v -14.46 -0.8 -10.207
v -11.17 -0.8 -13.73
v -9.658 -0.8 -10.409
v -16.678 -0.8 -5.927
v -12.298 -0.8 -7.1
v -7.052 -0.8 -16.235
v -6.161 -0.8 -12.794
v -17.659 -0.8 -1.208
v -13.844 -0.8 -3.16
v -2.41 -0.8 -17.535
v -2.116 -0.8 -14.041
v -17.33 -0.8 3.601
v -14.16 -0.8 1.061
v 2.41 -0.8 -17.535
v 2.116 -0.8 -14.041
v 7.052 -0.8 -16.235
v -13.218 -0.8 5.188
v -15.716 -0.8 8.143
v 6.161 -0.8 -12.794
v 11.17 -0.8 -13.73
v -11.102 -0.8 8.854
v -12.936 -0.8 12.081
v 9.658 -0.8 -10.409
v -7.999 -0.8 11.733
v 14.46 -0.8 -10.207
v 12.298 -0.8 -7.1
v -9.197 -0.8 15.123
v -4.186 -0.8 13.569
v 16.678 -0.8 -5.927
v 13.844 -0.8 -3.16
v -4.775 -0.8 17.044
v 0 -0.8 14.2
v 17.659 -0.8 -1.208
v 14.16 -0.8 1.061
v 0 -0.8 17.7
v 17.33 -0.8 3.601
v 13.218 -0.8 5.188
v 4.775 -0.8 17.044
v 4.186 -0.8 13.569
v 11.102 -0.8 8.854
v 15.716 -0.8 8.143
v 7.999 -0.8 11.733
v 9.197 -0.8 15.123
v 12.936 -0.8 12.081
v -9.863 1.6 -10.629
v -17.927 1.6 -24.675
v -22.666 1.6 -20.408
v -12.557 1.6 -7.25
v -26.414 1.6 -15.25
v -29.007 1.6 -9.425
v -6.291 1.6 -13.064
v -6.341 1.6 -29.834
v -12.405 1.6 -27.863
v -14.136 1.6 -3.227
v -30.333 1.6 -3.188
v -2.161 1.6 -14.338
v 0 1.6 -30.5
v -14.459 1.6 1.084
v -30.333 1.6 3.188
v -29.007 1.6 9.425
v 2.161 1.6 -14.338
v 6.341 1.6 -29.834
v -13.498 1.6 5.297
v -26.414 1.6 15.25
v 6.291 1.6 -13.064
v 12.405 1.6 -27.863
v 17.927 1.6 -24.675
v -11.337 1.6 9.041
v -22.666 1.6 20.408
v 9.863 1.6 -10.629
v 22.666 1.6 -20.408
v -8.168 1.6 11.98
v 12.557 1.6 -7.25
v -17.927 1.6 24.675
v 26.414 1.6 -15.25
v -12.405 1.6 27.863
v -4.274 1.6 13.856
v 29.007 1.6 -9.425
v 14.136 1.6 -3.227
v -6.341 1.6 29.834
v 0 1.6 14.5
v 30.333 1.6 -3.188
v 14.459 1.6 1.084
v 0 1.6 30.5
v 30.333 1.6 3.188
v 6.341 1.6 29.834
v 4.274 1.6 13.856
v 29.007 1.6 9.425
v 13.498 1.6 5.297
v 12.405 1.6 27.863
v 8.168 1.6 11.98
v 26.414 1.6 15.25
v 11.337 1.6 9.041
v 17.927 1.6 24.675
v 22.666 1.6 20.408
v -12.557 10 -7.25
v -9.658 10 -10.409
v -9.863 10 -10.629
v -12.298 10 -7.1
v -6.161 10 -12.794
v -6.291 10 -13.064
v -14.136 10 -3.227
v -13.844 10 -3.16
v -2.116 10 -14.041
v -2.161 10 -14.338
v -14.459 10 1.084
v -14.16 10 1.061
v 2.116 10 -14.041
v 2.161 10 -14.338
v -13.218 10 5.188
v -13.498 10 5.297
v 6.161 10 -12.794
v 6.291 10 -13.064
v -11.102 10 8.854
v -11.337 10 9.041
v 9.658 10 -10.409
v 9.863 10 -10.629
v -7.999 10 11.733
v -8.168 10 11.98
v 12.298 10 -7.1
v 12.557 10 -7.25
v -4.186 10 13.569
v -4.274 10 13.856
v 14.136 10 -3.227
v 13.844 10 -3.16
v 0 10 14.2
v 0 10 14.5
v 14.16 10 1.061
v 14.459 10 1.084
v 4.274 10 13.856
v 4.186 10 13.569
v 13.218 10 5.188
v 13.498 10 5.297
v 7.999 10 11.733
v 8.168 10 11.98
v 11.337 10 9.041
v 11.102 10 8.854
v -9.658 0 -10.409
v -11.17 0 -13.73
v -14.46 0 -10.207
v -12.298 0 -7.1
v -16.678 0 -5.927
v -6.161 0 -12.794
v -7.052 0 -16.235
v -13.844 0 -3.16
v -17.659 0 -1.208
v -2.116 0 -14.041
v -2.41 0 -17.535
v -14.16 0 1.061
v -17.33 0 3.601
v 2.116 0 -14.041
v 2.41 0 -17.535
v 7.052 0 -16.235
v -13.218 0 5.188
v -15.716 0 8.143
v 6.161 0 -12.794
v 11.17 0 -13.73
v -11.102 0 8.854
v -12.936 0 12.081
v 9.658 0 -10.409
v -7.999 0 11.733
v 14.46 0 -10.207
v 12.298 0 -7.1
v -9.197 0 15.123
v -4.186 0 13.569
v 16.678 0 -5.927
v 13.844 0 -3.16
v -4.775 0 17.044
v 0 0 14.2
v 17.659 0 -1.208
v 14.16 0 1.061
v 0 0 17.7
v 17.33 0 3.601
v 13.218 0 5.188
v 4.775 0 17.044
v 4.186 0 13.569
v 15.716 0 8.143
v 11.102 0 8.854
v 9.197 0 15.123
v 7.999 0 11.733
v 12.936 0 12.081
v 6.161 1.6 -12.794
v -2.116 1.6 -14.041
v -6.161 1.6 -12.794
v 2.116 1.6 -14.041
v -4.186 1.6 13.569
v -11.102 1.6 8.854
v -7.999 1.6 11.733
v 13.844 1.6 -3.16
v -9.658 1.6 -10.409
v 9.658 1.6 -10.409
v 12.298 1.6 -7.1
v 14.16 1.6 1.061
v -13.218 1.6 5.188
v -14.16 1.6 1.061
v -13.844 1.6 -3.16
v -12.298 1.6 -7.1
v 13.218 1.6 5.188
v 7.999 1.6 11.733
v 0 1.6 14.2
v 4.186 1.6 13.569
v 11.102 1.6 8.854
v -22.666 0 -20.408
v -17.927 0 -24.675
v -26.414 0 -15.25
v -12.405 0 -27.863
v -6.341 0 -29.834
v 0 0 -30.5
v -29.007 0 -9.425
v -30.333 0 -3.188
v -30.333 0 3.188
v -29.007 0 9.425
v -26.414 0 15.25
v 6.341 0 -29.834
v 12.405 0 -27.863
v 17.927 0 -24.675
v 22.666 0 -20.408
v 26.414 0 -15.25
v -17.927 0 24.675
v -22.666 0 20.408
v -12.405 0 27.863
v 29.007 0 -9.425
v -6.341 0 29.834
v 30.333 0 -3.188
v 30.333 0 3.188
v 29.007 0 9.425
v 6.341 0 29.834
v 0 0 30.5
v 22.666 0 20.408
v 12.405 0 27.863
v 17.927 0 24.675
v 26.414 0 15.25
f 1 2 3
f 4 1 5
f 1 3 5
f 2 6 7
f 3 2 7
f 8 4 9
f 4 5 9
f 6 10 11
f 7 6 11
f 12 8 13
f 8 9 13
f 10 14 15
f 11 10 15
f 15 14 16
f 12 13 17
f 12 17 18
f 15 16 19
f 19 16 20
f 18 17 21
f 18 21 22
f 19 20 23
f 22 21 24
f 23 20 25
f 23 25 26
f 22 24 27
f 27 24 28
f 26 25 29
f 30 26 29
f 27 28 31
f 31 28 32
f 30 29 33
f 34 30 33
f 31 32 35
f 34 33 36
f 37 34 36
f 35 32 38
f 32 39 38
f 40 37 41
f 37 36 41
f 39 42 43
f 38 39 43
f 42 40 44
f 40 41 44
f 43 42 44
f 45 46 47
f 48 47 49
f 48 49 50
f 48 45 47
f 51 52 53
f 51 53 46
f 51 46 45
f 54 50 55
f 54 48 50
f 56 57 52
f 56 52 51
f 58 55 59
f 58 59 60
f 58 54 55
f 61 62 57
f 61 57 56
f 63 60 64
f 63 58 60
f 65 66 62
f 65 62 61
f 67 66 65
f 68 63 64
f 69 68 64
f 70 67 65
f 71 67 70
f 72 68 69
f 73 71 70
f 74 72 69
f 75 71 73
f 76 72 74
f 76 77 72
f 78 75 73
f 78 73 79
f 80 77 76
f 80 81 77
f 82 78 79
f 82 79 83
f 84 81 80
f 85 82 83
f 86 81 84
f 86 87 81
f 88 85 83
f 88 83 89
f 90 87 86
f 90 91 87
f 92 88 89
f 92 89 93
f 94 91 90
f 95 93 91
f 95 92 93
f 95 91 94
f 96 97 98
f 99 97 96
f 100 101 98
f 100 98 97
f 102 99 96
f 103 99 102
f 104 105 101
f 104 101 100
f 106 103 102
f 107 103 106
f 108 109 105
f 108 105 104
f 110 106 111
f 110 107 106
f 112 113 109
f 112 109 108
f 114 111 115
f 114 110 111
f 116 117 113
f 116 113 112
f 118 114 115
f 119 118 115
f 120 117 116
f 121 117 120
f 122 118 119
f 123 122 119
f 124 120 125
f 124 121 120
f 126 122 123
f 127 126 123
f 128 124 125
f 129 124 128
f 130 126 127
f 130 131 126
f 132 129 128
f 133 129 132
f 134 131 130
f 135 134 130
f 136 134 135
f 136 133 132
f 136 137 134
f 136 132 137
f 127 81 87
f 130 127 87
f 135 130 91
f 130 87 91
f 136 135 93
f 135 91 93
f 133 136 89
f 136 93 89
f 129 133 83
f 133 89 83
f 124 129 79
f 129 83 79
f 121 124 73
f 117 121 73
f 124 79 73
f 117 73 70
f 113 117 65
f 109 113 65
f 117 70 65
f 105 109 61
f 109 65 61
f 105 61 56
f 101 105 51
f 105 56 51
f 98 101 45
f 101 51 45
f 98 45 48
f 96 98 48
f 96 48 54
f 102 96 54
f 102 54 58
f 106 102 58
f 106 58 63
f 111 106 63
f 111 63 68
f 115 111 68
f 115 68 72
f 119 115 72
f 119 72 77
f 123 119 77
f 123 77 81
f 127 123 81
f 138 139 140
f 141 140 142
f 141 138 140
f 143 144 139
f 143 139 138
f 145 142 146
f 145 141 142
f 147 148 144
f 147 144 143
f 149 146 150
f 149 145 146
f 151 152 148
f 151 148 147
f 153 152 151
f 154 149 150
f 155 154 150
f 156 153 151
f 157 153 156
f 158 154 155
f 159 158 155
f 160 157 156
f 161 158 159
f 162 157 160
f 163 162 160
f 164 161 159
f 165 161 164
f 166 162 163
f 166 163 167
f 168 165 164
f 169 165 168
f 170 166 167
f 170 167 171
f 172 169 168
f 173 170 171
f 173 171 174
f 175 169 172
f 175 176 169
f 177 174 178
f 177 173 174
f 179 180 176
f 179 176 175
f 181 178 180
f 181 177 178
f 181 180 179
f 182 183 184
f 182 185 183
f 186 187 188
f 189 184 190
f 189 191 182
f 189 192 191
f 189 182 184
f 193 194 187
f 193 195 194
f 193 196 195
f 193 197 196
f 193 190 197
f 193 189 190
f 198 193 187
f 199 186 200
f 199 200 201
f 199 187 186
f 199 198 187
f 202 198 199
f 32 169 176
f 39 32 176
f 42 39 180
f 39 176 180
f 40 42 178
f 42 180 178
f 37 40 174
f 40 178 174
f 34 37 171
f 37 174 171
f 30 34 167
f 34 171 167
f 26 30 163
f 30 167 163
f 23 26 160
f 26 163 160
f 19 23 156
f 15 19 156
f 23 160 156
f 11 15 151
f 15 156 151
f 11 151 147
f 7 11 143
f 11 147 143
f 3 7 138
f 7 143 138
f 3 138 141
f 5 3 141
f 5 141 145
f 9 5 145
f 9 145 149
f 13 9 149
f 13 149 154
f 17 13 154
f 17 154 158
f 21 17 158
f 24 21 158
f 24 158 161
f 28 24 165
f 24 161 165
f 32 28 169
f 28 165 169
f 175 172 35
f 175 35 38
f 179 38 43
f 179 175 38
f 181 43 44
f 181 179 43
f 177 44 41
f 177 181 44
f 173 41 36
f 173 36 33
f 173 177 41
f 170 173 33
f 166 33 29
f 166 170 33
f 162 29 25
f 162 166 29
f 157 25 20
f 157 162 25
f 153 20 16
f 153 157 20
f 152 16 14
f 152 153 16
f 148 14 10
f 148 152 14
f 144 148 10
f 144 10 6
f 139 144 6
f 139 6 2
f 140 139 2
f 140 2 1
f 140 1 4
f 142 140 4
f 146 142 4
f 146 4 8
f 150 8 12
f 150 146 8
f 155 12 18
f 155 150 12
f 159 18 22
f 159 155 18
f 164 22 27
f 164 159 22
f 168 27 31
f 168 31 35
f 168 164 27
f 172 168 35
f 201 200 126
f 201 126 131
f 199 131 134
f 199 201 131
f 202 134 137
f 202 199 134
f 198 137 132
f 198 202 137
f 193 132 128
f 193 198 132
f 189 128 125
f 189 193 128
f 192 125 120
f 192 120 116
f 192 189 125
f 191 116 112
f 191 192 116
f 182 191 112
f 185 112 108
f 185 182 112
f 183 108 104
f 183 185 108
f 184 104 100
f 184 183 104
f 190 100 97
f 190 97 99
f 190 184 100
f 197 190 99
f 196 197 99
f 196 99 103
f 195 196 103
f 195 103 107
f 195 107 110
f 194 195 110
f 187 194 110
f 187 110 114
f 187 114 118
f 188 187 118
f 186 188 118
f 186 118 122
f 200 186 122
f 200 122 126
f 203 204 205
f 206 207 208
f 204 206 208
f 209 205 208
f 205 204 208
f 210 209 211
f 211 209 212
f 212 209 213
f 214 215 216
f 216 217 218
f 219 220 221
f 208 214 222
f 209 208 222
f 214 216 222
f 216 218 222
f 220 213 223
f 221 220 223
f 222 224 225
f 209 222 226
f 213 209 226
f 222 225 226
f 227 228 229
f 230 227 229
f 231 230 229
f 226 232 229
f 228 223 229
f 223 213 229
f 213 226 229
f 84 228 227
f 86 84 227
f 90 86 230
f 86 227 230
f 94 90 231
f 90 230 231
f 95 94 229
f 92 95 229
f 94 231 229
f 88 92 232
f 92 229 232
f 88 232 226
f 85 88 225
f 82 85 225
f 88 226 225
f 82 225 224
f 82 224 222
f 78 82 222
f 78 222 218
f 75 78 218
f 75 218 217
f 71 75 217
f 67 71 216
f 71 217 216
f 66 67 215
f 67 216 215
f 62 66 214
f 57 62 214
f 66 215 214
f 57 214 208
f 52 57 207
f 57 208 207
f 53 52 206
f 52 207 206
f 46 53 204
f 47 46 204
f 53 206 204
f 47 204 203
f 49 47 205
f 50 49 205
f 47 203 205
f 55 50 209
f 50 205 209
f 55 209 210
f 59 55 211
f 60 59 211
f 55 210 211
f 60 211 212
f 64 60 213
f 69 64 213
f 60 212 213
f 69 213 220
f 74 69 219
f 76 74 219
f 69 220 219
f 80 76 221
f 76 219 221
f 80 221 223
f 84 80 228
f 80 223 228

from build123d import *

# Parameters (mm, degrees)
SKETCH_1_R      = 30.5
EXTRUDE_1_DEPTH = 1.6
SKETCH_2_R      = 14.5
SKETCH_2_R_2    = 14.2
EXTRUDE_2_DEPTH = 10
SKETCH_3_R      = 17.7
SKETCH_3_R_2    = 14.2
EXTRUDE_3_DEPTH = 0.8


with BuildPart() as part:
    # 스케치1 → 보스-돌출1 (new body)
    with BuildSketch(Plane(origin=(0, 0, 0), x_dir=(1, 0, 0), z_dir=(0, 1, 0))):
        with Locations(Location((0, 0, 0), (0, 0, 270))):
            Circle(SKETCH_1_R)
    extrude(amount=EXTRUDE_1_DEPTH)

    # 스케치2 → 보스-돌출2 (add)
    with BuildSketch(Plane(origin=(0, 0, 0), x_dir=(1, 0, 0), z_dir=(0, 1, 0))):
        with Locations(Location((0, 0, 0), (0, 0, 270))):
            Circle(SKETCH_2_R)
        with Locations(Location((0, 0, 0), (0, 0, 270))):
            Circle(SKETCH_2_R_2, mode=Mode.SUBTRACT)
    extrude(amount=EXTRUDE_2_DEPTH)


with BuildPart() as body_2:
    # 스케치3 → 보스-돌출3 (new body)
    with BuildSketch(Plane(origin=(0, 0, 0), x_dir=(1, 0, 0), z_dir=(0, 1, 0))):
        with Locations(Location((0, 0, 0), (0, 0, 270))):
            Circle(SKETCH_3_R)
        with Locations(Location((0, 0, 0), (0, 0, 270))):
            Circle(SKETCH_3_R_2, mode=Mode.SUBTRACT)
    extrude(amount=-EXTRUDE_3_DEPTH)


solid = Compound([part.part, body_2.part])
